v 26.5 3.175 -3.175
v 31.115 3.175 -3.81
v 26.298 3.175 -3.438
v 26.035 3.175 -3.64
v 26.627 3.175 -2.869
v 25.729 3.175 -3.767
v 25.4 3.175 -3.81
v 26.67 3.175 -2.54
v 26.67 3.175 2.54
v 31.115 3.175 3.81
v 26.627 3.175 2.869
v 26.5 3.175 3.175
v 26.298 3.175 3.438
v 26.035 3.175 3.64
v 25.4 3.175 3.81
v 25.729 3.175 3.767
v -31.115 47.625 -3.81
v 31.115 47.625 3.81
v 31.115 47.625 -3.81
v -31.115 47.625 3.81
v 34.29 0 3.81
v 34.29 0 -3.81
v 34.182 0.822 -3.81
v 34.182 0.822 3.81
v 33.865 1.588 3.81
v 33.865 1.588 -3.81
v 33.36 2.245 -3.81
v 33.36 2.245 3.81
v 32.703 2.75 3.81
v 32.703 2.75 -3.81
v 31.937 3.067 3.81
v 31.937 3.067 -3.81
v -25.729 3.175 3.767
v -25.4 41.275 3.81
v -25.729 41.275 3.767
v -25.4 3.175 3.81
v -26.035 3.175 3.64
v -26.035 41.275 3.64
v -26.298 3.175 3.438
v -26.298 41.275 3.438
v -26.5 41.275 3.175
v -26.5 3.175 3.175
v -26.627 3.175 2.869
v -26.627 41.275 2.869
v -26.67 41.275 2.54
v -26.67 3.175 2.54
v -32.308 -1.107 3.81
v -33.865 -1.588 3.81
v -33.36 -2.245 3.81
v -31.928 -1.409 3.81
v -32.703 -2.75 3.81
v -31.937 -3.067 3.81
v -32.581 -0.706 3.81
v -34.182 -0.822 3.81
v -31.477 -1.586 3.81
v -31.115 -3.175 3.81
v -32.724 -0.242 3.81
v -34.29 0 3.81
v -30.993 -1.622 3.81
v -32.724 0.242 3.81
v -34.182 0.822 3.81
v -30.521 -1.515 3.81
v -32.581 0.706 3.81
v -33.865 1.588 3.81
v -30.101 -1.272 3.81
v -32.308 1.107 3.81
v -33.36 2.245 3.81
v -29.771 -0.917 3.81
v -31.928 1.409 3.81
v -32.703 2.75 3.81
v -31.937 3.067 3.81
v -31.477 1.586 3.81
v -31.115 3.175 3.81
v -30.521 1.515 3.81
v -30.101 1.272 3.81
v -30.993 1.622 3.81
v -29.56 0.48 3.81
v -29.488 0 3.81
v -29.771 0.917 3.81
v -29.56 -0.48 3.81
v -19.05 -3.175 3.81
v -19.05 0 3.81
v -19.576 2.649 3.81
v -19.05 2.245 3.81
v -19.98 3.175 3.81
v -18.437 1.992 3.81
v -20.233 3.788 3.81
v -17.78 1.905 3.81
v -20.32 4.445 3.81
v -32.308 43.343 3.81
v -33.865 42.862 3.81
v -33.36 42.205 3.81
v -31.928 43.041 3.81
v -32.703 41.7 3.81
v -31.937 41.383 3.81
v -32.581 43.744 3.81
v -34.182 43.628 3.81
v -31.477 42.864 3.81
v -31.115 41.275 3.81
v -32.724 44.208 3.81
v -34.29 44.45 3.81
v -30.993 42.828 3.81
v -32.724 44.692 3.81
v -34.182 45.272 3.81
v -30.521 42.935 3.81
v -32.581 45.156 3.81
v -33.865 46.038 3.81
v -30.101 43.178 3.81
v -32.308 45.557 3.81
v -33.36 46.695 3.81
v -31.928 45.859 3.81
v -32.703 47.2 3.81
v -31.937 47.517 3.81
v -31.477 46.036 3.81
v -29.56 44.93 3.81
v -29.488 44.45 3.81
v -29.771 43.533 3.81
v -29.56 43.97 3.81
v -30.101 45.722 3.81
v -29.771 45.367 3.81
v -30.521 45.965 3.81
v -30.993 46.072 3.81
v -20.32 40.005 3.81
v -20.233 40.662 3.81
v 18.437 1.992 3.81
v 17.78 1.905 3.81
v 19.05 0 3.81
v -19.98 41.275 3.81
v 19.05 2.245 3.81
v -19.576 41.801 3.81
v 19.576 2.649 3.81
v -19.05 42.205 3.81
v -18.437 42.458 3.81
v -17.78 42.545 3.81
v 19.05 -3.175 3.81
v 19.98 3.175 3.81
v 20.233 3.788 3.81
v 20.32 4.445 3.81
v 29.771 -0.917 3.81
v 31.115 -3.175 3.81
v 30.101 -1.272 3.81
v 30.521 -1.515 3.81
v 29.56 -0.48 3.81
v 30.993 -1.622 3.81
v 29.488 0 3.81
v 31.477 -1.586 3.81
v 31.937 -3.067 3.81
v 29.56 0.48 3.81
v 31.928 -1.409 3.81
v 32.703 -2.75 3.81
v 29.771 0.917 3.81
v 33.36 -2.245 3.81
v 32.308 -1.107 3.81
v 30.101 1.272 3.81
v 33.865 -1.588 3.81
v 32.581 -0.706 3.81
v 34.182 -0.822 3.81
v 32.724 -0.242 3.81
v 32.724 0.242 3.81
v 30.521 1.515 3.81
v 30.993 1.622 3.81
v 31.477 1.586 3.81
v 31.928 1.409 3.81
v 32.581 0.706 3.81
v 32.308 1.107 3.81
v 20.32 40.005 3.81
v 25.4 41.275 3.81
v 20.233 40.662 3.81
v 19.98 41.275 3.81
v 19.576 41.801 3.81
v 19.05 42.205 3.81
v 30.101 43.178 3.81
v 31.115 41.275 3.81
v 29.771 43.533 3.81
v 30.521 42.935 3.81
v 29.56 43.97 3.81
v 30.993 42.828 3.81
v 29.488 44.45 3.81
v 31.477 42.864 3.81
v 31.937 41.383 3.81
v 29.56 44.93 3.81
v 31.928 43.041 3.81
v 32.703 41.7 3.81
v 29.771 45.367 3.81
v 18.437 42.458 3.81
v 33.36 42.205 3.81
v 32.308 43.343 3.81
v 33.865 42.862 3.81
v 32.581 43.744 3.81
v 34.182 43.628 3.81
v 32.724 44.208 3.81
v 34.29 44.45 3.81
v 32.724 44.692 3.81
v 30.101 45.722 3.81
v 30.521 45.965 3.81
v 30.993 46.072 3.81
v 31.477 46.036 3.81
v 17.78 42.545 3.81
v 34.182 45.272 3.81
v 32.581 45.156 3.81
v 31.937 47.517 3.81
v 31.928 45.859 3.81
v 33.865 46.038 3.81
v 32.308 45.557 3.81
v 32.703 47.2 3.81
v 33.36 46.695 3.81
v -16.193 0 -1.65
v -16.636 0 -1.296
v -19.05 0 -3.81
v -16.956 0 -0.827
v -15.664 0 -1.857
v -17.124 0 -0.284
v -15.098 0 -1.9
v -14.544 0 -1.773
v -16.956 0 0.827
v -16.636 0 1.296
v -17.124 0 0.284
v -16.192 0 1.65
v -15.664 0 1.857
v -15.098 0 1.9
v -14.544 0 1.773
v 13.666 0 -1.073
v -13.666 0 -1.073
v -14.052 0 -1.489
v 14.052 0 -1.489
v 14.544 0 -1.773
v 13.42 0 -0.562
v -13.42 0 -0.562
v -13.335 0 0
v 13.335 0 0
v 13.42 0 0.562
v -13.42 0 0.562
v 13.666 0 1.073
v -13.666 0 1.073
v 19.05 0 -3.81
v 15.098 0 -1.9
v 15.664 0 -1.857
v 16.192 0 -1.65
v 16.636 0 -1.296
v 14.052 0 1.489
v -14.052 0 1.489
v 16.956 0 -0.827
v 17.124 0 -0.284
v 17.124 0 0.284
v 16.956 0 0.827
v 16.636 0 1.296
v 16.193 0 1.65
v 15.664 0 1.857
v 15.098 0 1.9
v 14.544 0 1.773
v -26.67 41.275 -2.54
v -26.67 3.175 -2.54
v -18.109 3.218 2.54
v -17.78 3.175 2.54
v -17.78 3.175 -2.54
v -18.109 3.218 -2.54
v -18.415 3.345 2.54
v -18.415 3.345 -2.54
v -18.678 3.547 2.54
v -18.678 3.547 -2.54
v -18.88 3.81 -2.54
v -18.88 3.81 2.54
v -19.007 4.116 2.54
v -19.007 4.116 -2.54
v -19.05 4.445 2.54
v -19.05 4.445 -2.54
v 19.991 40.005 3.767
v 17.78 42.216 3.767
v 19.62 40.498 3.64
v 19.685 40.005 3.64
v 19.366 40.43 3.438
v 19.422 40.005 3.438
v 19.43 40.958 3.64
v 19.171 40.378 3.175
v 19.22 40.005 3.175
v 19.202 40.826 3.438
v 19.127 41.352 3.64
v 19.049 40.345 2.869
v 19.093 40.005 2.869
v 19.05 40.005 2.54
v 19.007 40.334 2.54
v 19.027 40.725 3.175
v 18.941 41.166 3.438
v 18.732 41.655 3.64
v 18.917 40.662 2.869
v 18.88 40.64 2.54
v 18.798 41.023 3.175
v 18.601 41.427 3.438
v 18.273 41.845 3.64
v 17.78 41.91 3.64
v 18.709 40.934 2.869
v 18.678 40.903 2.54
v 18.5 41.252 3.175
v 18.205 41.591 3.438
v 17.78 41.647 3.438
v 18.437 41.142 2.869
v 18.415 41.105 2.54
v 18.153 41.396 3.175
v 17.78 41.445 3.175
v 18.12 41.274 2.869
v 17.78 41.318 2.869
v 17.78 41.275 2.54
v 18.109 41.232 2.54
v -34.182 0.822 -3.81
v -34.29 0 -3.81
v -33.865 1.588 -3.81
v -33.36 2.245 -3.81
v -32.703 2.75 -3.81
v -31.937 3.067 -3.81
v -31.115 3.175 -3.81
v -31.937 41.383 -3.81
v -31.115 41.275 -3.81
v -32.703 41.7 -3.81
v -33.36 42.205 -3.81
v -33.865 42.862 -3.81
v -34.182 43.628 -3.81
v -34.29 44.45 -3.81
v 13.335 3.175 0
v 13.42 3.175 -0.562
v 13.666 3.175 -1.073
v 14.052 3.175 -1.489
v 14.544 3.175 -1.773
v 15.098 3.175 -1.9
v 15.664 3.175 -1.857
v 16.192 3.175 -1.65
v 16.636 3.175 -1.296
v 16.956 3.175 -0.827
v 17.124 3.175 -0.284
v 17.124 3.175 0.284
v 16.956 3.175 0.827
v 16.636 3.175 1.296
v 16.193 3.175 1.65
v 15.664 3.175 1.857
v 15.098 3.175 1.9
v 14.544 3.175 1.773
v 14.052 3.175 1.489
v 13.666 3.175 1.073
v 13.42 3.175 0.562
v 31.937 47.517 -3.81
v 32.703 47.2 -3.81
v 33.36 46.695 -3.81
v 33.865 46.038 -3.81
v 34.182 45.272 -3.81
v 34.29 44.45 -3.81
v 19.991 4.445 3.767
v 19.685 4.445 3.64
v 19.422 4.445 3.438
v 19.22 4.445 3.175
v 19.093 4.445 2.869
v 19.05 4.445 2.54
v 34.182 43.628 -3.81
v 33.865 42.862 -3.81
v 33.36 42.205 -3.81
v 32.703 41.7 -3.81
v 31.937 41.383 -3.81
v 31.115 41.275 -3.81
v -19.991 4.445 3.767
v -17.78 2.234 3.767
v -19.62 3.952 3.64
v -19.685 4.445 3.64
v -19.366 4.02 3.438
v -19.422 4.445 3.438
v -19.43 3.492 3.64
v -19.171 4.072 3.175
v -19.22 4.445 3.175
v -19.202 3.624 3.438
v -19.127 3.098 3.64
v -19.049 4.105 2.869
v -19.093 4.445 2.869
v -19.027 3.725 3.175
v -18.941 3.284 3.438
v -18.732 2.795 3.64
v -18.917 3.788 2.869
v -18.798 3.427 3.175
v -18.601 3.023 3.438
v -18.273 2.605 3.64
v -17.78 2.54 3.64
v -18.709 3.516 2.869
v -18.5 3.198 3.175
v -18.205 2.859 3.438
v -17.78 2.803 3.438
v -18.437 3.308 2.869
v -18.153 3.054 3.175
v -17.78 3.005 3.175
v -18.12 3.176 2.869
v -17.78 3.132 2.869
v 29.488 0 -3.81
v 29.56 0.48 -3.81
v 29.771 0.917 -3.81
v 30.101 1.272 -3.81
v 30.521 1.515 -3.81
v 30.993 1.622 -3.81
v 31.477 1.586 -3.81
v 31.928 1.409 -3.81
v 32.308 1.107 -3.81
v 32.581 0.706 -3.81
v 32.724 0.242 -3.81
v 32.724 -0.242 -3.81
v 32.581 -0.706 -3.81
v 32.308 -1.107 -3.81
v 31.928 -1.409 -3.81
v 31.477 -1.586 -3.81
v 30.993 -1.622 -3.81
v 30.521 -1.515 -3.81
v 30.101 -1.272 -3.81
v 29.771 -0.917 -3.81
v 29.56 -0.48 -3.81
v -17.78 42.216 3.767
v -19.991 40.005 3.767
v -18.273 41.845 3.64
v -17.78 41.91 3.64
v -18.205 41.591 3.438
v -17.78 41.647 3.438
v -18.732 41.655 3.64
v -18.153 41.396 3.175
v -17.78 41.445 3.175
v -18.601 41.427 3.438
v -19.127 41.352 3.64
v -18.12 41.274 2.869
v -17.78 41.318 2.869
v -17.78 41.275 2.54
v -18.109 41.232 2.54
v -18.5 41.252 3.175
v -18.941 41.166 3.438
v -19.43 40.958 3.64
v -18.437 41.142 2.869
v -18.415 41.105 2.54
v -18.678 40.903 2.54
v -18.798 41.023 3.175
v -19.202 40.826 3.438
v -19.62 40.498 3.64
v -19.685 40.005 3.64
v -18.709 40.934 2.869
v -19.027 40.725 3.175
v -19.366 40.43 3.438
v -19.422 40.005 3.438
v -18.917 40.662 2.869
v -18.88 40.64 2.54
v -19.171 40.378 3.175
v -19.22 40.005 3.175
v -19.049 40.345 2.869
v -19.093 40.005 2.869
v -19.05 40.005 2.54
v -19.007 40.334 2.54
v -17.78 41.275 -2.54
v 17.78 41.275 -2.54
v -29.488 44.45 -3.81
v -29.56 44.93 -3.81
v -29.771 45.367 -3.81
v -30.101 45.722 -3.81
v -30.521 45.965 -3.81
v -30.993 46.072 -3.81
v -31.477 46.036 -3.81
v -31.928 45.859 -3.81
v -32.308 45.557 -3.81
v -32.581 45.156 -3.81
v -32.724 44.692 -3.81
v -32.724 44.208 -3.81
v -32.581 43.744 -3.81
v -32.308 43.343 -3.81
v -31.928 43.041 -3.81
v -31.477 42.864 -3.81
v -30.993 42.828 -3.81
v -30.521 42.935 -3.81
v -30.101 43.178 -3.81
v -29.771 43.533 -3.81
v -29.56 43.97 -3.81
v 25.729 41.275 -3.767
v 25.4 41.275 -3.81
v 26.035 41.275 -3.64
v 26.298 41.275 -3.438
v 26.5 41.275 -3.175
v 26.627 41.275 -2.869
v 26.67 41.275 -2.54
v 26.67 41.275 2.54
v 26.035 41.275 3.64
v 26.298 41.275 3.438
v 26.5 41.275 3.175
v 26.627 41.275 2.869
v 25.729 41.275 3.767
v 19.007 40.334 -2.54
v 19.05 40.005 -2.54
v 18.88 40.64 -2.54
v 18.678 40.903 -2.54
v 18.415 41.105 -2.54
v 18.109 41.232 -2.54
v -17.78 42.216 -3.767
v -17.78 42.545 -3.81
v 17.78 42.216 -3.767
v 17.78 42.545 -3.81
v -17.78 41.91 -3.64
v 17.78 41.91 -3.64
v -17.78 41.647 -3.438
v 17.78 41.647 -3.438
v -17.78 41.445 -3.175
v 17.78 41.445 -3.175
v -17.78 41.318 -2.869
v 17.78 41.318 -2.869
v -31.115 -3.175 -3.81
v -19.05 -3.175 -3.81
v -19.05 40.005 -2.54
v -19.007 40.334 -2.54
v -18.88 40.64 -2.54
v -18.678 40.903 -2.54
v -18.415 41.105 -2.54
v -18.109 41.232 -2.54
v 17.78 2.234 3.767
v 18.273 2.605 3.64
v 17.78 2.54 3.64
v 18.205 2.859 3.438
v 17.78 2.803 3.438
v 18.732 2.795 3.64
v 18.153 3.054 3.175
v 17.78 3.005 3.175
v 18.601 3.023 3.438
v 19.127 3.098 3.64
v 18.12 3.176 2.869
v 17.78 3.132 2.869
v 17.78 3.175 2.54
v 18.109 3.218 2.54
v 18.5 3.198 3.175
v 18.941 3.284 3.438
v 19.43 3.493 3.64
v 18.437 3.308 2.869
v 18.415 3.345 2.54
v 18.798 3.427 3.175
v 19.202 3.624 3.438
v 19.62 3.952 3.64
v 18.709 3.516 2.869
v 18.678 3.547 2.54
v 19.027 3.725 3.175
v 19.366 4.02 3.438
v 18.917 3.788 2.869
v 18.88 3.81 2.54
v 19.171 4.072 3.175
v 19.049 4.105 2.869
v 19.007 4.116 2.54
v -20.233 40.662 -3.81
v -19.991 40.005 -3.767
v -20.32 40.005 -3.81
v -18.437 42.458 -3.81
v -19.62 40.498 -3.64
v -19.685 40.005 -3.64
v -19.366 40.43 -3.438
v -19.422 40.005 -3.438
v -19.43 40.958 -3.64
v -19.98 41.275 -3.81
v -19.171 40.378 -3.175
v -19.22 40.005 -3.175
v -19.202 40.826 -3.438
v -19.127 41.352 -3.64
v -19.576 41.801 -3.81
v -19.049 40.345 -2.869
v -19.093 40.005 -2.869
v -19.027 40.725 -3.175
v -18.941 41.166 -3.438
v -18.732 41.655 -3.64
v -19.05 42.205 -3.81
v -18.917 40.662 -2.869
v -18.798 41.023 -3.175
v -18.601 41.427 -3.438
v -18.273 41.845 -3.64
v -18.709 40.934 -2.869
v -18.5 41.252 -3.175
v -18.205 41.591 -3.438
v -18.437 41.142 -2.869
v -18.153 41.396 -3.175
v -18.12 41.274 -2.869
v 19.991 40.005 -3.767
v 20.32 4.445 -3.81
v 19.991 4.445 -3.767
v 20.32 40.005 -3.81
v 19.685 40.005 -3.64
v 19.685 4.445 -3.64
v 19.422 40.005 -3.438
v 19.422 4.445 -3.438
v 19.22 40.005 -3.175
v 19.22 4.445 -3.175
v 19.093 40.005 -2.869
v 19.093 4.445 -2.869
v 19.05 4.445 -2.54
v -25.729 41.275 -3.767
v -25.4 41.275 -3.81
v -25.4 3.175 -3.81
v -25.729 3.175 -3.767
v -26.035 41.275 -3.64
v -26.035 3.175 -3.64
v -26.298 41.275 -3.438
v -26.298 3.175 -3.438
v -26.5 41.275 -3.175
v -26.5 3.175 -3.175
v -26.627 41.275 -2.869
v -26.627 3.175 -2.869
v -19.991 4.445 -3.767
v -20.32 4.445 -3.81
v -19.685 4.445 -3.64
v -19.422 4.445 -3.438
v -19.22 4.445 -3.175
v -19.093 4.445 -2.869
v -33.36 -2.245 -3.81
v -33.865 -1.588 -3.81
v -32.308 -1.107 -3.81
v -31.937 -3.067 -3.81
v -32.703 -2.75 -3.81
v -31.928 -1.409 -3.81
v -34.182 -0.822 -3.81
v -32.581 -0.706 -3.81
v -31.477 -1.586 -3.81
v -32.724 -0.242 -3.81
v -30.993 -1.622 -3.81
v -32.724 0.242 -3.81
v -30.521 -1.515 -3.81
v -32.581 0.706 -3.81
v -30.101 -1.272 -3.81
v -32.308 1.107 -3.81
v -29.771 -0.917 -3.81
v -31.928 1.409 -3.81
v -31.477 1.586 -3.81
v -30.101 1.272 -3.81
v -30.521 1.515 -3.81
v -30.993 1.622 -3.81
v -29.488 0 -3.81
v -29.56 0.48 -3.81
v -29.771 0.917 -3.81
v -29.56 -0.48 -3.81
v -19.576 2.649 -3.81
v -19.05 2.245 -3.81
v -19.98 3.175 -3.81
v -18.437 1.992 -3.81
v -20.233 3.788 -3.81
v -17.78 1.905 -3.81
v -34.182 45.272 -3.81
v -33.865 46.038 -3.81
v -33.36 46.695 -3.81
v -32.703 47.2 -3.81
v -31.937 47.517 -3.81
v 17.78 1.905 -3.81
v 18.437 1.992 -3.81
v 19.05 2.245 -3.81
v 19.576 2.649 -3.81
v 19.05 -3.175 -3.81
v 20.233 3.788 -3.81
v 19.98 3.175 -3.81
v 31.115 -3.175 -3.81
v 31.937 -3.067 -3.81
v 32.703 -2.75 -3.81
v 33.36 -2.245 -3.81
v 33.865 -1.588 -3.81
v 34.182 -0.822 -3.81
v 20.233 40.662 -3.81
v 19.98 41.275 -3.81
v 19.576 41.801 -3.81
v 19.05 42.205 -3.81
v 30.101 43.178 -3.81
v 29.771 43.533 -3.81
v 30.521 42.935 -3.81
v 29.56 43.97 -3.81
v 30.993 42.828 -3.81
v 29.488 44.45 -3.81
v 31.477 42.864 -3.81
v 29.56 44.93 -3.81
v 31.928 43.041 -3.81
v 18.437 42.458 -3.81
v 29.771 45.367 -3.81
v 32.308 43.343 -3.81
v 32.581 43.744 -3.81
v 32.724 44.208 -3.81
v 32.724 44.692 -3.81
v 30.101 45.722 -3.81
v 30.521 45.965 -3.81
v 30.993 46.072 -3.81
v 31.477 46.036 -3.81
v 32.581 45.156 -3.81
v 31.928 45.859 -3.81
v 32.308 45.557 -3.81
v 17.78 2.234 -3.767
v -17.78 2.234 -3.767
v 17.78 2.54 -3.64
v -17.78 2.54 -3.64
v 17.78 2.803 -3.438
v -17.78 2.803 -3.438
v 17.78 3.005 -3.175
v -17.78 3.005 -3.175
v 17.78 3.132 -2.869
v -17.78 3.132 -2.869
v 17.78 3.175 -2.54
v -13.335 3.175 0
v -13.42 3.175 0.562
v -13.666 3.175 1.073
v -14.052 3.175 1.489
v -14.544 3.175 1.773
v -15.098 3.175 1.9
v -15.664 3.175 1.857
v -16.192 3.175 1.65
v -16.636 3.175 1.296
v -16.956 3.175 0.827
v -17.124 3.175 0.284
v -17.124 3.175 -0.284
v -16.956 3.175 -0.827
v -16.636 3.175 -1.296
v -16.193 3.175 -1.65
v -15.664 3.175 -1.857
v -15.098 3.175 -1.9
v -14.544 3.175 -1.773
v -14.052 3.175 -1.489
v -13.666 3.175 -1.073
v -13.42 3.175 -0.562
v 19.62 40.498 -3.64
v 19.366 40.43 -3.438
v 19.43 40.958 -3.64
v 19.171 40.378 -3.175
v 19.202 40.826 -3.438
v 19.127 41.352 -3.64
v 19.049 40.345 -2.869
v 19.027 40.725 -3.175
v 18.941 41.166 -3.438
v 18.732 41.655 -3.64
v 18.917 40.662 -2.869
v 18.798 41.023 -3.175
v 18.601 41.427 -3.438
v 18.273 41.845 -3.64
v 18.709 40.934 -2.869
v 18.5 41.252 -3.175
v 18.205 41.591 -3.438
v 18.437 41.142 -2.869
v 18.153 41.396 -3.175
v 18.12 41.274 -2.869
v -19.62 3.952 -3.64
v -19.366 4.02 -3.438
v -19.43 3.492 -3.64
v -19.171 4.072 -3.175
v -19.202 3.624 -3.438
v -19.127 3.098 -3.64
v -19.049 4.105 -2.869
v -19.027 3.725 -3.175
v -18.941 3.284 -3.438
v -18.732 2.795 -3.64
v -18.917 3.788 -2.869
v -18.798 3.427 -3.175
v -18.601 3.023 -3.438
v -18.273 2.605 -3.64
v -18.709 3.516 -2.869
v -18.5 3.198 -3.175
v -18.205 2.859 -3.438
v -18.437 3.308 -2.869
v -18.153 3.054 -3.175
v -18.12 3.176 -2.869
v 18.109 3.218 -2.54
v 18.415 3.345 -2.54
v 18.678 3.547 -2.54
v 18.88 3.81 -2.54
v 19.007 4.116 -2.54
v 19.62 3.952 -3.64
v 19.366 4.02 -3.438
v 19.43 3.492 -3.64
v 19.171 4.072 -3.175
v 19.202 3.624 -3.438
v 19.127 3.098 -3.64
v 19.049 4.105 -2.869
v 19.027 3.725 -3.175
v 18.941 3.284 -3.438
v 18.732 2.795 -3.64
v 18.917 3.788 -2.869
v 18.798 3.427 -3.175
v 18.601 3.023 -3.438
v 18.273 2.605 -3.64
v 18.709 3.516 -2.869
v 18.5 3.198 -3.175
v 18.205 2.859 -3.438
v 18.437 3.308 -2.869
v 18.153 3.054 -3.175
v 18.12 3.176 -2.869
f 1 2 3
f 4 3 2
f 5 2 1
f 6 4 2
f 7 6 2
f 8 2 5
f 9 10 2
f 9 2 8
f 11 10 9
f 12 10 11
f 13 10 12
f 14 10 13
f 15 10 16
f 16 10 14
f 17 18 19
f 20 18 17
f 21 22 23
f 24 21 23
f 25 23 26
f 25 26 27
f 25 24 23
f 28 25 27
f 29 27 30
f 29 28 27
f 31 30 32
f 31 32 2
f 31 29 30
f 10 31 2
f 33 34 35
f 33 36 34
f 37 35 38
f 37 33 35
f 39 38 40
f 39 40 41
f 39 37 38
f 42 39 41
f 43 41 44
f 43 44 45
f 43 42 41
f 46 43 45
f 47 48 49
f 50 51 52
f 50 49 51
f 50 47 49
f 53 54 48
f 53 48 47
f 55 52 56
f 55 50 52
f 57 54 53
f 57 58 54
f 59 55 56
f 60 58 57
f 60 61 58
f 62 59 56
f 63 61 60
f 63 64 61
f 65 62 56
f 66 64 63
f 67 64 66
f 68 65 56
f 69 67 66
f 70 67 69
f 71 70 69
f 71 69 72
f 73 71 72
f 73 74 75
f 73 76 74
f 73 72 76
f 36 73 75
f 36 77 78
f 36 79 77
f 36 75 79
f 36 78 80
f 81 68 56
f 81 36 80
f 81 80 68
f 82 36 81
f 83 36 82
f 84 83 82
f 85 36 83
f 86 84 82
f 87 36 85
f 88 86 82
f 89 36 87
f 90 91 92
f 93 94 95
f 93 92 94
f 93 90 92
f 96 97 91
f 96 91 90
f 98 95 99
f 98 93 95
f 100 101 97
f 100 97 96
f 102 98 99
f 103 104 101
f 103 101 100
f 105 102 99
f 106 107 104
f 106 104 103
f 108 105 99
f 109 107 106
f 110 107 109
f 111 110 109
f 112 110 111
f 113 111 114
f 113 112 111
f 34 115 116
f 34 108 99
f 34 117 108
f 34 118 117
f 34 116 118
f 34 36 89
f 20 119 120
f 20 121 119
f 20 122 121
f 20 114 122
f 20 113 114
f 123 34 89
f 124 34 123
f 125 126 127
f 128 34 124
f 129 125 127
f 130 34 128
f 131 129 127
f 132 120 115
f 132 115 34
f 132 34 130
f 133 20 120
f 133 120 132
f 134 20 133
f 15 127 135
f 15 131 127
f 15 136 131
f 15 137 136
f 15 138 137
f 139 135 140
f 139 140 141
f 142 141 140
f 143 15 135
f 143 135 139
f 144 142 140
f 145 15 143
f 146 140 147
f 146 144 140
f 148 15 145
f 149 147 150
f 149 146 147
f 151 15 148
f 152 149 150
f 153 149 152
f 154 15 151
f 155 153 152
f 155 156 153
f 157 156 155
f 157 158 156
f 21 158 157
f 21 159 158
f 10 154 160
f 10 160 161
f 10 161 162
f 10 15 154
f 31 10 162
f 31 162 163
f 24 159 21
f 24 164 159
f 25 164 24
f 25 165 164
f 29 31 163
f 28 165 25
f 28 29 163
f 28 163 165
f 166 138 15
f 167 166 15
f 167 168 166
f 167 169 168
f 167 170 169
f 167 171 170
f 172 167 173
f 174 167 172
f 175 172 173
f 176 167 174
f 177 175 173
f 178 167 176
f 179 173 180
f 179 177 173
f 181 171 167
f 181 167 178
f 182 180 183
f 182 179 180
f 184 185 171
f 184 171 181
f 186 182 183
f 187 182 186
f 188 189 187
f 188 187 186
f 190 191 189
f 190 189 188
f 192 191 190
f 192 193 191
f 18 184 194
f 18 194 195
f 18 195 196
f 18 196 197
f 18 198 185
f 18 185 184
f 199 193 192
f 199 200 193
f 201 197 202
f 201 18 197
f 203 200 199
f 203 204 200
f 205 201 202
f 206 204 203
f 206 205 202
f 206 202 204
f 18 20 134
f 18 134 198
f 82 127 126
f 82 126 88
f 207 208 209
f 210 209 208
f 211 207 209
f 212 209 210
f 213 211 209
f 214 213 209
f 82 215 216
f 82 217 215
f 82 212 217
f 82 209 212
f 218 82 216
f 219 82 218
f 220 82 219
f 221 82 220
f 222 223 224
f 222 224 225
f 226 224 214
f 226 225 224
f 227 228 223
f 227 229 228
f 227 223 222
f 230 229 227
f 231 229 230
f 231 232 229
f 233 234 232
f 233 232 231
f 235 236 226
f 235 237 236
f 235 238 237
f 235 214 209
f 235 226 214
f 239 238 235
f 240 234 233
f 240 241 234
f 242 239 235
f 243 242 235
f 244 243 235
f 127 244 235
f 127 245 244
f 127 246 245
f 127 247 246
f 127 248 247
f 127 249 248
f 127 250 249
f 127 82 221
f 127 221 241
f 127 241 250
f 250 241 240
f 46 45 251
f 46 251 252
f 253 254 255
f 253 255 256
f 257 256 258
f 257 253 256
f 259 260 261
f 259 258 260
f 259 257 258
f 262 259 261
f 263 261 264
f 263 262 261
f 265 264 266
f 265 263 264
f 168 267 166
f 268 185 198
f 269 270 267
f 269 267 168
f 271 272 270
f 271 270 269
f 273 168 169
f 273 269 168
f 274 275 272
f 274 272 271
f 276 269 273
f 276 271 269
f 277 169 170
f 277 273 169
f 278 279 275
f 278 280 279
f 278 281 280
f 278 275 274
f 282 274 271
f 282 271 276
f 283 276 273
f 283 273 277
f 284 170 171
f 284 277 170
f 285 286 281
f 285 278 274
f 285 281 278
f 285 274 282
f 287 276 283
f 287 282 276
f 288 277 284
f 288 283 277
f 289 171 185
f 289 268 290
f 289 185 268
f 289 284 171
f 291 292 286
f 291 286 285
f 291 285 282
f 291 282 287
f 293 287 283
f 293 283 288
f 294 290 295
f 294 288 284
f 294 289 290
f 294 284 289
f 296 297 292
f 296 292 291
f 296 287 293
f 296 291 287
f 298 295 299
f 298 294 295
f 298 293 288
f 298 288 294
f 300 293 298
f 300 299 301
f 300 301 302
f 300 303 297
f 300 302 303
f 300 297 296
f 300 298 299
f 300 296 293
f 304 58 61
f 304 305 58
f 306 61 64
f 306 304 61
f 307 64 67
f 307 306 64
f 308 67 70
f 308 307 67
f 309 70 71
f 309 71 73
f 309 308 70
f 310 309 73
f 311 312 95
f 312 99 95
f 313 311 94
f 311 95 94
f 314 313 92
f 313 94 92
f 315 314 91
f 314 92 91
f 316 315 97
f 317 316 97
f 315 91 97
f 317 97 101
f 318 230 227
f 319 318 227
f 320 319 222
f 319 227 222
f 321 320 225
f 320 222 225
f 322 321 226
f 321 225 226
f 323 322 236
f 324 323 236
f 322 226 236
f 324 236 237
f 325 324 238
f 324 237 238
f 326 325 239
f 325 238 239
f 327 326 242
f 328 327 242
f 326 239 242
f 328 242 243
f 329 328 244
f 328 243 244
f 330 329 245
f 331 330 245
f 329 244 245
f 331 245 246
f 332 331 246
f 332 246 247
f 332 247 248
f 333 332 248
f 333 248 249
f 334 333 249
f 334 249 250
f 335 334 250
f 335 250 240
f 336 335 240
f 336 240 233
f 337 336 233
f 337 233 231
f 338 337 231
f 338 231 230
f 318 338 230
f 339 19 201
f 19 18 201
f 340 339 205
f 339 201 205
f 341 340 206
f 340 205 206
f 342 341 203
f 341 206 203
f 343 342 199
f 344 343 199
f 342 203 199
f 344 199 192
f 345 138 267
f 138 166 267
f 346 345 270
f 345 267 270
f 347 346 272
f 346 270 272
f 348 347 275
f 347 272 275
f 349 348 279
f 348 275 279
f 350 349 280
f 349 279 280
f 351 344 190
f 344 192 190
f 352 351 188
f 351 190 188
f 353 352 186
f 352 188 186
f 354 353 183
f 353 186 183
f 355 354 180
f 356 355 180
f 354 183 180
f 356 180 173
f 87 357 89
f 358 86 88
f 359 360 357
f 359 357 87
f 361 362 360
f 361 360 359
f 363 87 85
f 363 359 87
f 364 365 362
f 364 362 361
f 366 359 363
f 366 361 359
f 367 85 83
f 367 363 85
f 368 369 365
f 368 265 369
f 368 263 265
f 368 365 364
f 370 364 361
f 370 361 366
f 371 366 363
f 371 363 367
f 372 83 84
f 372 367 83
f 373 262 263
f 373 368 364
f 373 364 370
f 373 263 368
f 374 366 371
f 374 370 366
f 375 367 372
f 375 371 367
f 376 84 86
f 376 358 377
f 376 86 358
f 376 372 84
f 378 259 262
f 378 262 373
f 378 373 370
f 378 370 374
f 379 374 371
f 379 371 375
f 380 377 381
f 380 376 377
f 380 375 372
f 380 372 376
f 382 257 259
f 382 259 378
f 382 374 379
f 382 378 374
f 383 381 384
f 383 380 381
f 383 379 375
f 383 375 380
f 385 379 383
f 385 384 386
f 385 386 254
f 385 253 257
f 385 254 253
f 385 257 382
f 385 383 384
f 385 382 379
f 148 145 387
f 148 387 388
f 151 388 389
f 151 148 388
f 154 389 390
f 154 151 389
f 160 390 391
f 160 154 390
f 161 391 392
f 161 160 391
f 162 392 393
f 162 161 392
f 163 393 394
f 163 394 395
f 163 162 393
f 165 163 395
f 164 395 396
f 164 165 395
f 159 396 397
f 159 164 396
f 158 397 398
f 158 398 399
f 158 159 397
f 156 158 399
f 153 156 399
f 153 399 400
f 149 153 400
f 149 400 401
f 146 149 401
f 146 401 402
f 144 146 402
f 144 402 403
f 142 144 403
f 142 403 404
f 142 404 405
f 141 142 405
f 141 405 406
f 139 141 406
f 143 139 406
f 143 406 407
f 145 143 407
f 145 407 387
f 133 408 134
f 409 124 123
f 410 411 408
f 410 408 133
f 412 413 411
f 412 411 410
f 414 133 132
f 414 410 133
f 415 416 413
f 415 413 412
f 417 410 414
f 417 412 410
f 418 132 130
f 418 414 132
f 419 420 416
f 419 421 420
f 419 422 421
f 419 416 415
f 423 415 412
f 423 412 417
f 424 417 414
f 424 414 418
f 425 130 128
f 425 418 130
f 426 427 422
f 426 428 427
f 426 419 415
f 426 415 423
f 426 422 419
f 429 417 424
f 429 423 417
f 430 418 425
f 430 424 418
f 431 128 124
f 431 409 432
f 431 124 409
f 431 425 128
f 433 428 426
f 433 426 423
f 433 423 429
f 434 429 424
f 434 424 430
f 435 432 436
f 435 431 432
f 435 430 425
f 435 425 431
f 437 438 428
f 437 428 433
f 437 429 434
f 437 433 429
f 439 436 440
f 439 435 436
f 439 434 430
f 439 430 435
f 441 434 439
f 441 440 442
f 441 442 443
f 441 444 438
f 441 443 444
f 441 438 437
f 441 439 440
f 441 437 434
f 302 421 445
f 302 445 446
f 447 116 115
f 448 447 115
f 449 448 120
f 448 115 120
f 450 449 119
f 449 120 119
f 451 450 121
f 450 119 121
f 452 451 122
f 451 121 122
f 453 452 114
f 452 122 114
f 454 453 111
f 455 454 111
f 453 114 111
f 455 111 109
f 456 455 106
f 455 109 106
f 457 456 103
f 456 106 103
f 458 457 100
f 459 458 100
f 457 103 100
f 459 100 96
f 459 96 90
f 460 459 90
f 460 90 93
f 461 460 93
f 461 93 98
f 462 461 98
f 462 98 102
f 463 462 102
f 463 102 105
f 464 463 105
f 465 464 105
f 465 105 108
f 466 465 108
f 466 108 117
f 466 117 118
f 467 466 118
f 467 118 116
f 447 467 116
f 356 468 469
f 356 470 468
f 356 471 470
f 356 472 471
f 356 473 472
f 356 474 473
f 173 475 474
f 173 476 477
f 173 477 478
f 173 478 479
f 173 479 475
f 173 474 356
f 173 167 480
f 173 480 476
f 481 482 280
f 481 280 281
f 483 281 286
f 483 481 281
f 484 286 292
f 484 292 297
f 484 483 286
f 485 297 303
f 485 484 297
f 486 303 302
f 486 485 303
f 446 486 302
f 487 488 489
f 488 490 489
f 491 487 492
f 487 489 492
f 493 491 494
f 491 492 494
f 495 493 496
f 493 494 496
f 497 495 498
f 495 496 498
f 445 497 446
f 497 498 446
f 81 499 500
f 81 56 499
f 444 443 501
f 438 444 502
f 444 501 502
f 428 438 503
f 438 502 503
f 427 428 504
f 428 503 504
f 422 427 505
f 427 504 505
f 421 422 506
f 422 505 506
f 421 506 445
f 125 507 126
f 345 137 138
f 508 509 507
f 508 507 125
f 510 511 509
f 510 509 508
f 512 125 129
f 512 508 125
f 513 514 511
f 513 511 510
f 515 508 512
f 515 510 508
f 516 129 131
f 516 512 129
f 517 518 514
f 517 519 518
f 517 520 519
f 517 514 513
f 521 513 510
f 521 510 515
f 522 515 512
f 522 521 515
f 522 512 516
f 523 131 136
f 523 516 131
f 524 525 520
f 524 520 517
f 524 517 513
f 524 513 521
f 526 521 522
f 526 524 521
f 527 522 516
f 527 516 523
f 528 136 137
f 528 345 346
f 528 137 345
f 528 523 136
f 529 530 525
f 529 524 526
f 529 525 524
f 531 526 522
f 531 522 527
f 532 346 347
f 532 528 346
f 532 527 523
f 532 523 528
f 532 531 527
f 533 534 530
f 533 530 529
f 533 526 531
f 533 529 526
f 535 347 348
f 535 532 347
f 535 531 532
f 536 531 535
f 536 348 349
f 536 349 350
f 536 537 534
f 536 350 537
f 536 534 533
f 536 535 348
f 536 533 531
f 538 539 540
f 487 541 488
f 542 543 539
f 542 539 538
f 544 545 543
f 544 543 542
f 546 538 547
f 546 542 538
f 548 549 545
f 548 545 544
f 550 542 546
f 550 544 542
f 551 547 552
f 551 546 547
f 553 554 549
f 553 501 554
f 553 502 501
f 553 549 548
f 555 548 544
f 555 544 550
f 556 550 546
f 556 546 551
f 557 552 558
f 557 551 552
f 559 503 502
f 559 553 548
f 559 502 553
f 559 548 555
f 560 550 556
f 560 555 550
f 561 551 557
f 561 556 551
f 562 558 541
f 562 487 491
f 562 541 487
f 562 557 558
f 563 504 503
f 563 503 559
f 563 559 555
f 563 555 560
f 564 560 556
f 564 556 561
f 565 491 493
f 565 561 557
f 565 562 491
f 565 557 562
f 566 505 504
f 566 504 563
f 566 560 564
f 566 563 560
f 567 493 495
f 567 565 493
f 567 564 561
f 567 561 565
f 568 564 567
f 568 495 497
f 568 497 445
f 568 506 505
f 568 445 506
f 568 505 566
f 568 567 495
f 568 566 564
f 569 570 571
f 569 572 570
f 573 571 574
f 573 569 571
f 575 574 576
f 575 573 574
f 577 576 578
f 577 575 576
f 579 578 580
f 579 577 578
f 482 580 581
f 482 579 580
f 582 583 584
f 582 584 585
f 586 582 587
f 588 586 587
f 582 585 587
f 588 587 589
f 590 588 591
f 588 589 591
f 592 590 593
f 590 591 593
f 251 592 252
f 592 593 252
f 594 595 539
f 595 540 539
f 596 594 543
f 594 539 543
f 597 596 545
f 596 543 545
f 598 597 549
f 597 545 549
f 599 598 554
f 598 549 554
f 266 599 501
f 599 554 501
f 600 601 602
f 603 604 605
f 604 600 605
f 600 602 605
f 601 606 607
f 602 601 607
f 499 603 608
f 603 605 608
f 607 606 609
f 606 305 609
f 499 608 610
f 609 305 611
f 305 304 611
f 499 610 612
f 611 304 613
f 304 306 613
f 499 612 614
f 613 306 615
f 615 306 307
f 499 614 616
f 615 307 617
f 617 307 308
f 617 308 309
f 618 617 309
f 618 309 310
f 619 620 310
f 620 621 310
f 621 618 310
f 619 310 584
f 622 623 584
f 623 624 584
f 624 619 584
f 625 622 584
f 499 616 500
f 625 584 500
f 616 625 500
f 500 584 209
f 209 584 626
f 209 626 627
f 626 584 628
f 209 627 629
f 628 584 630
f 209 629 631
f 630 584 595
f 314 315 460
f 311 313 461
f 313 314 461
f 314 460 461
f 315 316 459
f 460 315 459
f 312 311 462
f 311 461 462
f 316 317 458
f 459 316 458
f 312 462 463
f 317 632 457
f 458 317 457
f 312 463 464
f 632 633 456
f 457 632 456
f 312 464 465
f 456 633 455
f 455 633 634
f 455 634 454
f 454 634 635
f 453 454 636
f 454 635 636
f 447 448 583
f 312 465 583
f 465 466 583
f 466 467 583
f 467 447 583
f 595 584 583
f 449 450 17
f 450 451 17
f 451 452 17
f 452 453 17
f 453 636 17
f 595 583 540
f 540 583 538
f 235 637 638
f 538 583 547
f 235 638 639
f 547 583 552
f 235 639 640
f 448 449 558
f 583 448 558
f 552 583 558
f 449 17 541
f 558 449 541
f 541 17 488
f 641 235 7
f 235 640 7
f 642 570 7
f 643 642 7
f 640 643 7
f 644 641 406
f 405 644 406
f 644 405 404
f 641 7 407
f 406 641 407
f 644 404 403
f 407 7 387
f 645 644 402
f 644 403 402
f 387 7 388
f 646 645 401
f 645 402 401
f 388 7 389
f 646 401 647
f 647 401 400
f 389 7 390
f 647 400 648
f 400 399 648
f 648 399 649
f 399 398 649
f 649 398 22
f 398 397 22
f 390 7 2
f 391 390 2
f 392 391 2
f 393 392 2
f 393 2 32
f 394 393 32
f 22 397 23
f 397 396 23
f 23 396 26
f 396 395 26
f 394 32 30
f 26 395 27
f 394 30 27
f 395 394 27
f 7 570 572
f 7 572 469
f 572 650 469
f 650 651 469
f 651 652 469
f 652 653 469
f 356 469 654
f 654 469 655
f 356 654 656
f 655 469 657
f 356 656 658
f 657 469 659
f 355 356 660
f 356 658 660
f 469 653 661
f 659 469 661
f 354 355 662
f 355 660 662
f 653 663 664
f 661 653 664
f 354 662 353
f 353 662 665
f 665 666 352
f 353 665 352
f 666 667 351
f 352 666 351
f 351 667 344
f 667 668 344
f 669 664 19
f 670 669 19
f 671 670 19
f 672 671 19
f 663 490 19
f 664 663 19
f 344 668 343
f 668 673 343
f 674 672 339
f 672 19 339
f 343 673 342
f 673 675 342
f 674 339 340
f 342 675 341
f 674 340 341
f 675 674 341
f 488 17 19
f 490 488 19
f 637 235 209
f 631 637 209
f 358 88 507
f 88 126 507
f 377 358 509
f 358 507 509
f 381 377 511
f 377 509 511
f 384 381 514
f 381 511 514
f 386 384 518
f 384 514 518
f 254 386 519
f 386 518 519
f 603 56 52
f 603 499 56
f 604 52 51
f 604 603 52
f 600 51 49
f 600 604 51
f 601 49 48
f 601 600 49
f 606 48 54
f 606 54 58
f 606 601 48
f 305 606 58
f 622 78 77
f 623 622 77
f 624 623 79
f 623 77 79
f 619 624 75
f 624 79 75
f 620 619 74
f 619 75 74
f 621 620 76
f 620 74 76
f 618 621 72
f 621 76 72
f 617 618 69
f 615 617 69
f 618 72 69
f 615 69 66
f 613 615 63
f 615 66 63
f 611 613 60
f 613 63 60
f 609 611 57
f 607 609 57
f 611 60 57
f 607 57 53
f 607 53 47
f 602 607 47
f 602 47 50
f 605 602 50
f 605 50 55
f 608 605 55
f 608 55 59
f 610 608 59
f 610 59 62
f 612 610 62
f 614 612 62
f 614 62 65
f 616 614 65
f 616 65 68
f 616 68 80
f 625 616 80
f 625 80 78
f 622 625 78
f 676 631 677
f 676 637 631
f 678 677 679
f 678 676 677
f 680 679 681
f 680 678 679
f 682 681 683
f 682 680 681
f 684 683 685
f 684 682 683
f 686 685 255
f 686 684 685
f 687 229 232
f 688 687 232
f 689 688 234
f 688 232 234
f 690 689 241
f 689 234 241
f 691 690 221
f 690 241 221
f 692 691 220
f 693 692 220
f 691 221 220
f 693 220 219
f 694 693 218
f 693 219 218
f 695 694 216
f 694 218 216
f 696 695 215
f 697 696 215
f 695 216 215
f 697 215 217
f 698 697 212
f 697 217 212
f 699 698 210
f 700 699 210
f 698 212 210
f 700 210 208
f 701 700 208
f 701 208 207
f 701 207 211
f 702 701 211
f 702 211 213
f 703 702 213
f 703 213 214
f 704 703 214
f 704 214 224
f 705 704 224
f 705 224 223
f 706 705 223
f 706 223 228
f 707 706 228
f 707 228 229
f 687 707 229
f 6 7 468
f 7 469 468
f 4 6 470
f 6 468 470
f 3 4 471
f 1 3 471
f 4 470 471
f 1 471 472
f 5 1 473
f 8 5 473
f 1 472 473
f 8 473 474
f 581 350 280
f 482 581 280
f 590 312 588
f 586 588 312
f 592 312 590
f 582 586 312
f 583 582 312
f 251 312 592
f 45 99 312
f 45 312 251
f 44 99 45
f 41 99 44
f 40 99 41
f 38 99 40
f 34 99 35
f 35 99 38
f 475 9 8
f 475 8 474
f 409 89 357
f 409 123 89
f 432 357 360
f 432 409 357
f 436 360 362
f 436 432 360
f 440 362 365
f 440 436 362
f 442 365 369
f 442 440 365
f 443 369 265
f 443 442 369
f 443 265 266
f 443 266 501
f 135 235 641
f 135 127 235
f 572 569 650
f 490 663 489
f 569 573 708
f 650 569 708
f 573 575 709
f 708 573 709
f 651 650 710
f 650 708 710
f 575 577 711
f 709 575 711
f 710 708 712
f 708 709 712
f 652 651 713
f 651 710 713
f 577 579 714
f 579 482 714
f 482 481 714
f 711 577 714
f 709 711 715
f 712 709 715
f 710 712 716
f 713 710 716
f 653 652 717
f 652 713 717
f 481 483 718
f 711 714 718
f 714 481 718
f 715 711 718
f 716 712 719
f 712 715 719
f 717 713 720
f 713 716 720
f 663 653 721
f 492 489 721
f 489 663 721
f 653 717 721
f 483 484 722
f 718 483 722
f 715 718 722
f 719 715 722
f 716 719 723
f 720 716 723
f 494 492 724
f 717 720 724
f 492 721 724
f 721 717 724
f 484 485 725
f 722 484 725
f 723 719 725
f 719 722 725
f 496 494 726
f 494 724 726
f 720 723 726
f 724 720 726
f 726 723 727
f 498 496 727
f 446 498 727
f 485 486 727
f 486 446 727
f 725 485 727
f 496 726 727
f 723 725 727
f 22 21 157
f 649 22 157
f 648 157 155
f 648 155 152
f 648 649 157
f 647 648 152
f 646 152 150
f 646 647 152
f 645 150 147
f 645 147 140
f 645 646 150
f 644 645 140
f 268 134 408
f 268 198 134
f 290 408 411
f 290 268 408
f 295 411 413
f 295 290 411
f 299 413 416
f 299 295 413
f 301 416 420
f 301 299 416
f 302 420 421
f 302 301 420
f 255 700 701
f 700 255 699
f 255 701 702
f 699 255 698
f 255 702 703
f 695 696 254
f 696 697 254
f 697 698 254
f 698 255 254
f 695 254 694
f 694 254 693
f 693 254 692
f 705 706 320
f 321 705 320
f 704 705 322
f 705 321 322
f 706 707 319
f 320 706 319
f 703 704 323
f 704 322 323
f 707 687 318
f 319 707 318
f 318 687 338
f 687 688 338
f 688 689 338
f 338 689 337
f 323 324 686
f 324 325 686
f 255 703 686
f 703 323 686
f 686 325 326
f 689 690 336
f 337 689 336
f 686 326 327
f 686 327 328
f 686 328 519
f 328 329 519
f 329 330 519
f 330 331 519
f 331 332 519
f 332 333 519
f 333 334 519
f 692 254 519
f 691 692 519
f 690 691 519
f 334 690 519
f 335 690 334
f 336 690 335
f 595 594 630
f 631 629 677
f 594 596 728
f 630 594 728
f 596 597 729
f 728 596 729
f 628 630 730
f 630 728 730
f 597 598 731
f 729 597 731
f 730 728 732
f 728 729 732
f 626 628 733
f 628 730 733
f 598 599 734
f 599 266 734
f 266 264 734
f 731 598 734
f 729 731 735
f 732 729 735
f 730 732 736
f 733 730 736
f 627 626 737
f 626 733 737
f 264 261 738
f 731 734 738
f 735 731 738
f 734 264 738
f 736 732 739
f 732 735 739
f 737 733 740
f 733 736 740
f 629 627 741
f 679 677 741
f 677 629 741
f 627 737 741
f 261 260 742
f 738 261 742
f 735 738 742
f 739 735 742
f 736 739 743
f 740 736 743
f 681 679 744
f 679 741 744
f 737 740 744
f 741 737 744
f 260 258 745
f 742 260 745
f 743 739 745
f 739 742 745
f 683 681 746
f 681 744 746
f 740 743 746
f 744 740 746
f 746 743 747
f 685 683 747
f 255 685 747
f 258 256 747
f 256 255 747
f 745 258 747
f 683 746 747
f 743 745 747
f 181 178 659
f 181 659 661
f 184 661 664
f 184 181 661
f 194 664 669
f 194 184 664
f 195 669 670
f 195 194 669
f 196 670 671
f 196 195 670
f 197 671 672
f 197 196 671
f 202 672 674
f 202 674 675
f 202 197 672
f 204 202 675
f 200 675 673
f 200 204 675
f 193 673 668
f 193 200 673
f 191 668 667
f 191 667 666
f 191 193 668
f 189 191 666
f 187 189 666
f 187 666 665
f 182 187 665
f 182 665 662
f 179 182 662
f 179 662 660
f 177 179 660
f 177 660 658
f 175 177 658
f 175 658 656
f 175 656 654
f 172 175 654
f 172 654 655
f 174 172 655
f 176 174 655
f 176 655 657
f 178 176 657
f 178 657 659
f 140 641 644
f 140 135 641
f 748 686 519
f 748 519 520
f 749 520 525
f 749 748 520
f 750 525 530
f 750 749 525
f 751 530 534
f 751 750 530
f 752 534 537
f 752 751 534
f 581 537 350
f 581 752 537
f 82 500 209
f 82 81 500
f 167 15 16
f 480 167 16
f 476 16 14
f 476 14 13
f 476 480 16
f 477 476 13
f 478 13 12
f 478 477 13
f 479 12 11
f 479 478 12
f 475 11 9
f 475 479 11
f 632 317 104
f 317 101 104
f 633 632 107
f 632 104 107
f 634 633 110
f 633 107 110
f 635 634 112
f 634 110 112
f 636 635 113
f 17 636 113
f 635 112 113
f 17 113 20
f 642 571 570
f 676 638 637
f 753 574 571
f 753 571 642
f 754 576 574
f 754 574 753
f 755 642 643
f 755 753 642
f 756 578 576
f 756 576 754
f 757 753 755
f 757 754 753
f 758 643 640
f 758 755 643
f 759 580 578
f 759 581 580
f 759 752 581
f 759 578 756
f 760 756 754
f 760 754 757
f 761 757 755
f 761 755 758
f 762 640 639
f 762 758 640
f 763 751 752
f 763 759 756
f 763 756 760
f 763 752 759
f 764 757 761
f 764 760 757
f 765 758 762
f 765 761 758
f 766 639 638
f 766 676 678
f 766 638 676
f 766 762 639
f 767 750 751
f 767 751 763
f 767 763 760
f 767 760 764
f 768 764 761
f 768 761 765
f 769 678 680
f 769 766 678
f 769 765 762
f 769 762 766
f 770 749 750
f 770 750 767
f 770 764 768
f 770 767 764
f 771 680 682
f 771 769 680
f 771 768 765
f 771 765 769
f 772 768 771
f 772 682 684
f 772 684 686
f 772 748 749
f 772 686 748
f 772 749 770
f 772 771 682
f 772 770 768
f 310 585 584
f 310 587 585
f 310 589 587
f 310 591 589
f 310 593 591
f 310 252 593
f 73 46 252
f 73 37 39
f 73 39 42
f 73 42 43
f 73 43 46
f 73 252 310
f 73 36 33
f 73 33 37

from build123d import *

# Parameters (mm, degrees)
SKETCH3_W           = 38.1
SKETCH3_H           = 38.1
BOSS_EXTRUDE2_DEPTH = 3.81
FILLET1_R           = 3.175
CUT_EXTRUDE1_REACH  = 61.178
SKETCH4_R           = 1.627
FILLET2_R           = 1.27
CUT_EXTRUDE2_REACH  = 60.809
SKETCH5_R           = 1.905


with BuildPart() as part:
    # Sketch3 → Boss-Extrude2 (new, symmetric)
    with BuildSketch(Plane.XY):
        Polygon((34.29, -3.175), (34.29, 3.175), (26.67, 3.175), (26.67, 41.275), (34.29, 41.275), (34.29, 47.625), (-34.29, 47.625), (-34.29, 41.275), (-26.67, 41.275), (-26.67, 3.175), (-34.29, 3.175), (-34.29, -3.175), (-19.05, -3.175), (-19.05, 0), (19.05, 0), (19.05, -3.175), align=None)
        with Locations((0, 22.225)):
            Rectangle(SKETCH3_W, SKETCH3_H, mode=Mode.SUBTRACT)
    extrude(amount=BOSS_EXTRUDE2_DEPTH, both=True)

    # Fillet1
    fillet1_edges = [part.edges().sort_by_distance(p)[0] for p in [
        (34.29, 3.175, 0),
        (34.29, 41.275, 0),
        (34.29, 47.625, 0),
        (-34.29, 3.175, 0),
        (-34.29, 41.275, 0),
        (-34.29, 47.625, 0),
        (34.29, -3.175, 0),
        (-34.29, -3.175, 0),
    ]]
    fillet(fillet1_edges, radius=FILLET1_R - 0.0001)  # a hair under: the kernel refuses the full size

    # Sketch4 → Cut-Extrude1 (cut, up to next)
    with BuildSketch(Plane.XY.offset(3.81), mode=Mode.PRIVATE) as cut_extrude1_sk1:
        with Locations((-31.115, 44.45)):
            Circle(SKETCH4_R)
    cut_extrude1_tool1 = extrude(cut_extrude1_sk1.sketch, amount=-CUT_EXTRUDE1_REACH, mode=Mode.PRIVATE) & part.part
    # Sketch4 → Cut-Extrude1 (cut, up to next)
    with BuildSketch(Plane.XY.offset(3.81), mode=Mode.PRIVATE) as cut_extrude1_sk2:
        with Locations((-31.115, 0)):
            Circle(SKETCH4_R)
    cut_extrude1_tool2 = extrude(cut_extrude1_sk2.sketch, amount=-CUT_EXTRUDE1_REACH, mode=Mode.PRIVATE) & part.part
    cut_extrude1_1 = cut_extrude1_tool1.solids().sort_by_distance((-31.115, 44.45, 3.81))[0]
    add(cut_extrude1_1, mode=Mode.SUBTRACT)
    cut_extrude1_2 = cut_extrude1_tool2.solids().sort_by_distance((-31.115, 0, 3.81))[0]
    add(cut_extrude1_2, mode=Mode.SUBTRACT)
    cut_extrude1 = cut_extrude1_1 + cut_extrude1_2  # Cut-Extrude1 as one shape, for the pattern or mirror that repeats it

    # Mirror1: Cut-Extrude1 across plane
    add(cut_extrude1.mirror(Plane(origin=(0, 0, 0), x_dir=(0, 0, 1), z_dir=(1, 0, 0))), mode=Mode.SUBTRACT)

    # Fillet2
    fillet2_edges = [part.edges().sort_by_distance(p)[0] for p in [
        (0, 3.175, 3.81),
        (0, 3.175, -3.81),
        (0, 41.275, 3.81),
        (0, 41.275, -3.81),
        (19.05, 41.275, 0),
        (19.05, 22.225, 3.81),
        (19.05, 3.175, 0),
        (19.05, 22.225, -3.81),
        (-19.05, 3.175, 0),
        (-19.05, 22.225, 3.81),
        (-19.05, 41.275, 0),
        (-19.05, 22.225, -3.81),
        (26.67, 22.225, 3.81),
        (26.67, 22.225, -3.81),
        (-26.67, 22.225, -3.81),
        (-26.67, 22.225, 3.81),
    ]]
    fillet(fillet2_edges, radius=FILLET2_R)

    # Sketch5 → Cut-Extrude2 (cut, up to next)
    with BuildSketch(Plane.XZ, mode=Mode.PRIVATE) as cut_extrude2_sk1:
        with Locations((-15.24, 0)):
            Circle(SKETCH5_R)
    cut_extrude2_tool1 = extrude(cut_extrude2_sk1.sketch, amount=-CUT_EXTRUDE2_REACH, mode=Mode.PRIVATE) & part.part
    # Sketch5 → Cut-Extrude2 (cut, up to next)
    with BuildSketch(Plane.XZ, mode=Mode.PRIVATE) as cut_extrude2_sk2:
        with Locations(Location((15.24, 0, 0), (0, 0, 180))):
            Circle(SKETCH5_R)
    cut_extrude2_tool2 = extrude(cut_extrude2_sk2.sketch, amount=-CUT_EXTRUDE2_REACH, mode=Mode.PRIVATE) & part.part
    add(cut_extrude2_tool1.solids().sort_by_distance((-15.24, 0, 0))[0], mode=Mode.SUBTRACT)
    add(cut_extrude2_tool2.solids().sort_by_distance((15.24, 0, 0))[0], mode=Mode.SUBTRACT)


solid = part.part
